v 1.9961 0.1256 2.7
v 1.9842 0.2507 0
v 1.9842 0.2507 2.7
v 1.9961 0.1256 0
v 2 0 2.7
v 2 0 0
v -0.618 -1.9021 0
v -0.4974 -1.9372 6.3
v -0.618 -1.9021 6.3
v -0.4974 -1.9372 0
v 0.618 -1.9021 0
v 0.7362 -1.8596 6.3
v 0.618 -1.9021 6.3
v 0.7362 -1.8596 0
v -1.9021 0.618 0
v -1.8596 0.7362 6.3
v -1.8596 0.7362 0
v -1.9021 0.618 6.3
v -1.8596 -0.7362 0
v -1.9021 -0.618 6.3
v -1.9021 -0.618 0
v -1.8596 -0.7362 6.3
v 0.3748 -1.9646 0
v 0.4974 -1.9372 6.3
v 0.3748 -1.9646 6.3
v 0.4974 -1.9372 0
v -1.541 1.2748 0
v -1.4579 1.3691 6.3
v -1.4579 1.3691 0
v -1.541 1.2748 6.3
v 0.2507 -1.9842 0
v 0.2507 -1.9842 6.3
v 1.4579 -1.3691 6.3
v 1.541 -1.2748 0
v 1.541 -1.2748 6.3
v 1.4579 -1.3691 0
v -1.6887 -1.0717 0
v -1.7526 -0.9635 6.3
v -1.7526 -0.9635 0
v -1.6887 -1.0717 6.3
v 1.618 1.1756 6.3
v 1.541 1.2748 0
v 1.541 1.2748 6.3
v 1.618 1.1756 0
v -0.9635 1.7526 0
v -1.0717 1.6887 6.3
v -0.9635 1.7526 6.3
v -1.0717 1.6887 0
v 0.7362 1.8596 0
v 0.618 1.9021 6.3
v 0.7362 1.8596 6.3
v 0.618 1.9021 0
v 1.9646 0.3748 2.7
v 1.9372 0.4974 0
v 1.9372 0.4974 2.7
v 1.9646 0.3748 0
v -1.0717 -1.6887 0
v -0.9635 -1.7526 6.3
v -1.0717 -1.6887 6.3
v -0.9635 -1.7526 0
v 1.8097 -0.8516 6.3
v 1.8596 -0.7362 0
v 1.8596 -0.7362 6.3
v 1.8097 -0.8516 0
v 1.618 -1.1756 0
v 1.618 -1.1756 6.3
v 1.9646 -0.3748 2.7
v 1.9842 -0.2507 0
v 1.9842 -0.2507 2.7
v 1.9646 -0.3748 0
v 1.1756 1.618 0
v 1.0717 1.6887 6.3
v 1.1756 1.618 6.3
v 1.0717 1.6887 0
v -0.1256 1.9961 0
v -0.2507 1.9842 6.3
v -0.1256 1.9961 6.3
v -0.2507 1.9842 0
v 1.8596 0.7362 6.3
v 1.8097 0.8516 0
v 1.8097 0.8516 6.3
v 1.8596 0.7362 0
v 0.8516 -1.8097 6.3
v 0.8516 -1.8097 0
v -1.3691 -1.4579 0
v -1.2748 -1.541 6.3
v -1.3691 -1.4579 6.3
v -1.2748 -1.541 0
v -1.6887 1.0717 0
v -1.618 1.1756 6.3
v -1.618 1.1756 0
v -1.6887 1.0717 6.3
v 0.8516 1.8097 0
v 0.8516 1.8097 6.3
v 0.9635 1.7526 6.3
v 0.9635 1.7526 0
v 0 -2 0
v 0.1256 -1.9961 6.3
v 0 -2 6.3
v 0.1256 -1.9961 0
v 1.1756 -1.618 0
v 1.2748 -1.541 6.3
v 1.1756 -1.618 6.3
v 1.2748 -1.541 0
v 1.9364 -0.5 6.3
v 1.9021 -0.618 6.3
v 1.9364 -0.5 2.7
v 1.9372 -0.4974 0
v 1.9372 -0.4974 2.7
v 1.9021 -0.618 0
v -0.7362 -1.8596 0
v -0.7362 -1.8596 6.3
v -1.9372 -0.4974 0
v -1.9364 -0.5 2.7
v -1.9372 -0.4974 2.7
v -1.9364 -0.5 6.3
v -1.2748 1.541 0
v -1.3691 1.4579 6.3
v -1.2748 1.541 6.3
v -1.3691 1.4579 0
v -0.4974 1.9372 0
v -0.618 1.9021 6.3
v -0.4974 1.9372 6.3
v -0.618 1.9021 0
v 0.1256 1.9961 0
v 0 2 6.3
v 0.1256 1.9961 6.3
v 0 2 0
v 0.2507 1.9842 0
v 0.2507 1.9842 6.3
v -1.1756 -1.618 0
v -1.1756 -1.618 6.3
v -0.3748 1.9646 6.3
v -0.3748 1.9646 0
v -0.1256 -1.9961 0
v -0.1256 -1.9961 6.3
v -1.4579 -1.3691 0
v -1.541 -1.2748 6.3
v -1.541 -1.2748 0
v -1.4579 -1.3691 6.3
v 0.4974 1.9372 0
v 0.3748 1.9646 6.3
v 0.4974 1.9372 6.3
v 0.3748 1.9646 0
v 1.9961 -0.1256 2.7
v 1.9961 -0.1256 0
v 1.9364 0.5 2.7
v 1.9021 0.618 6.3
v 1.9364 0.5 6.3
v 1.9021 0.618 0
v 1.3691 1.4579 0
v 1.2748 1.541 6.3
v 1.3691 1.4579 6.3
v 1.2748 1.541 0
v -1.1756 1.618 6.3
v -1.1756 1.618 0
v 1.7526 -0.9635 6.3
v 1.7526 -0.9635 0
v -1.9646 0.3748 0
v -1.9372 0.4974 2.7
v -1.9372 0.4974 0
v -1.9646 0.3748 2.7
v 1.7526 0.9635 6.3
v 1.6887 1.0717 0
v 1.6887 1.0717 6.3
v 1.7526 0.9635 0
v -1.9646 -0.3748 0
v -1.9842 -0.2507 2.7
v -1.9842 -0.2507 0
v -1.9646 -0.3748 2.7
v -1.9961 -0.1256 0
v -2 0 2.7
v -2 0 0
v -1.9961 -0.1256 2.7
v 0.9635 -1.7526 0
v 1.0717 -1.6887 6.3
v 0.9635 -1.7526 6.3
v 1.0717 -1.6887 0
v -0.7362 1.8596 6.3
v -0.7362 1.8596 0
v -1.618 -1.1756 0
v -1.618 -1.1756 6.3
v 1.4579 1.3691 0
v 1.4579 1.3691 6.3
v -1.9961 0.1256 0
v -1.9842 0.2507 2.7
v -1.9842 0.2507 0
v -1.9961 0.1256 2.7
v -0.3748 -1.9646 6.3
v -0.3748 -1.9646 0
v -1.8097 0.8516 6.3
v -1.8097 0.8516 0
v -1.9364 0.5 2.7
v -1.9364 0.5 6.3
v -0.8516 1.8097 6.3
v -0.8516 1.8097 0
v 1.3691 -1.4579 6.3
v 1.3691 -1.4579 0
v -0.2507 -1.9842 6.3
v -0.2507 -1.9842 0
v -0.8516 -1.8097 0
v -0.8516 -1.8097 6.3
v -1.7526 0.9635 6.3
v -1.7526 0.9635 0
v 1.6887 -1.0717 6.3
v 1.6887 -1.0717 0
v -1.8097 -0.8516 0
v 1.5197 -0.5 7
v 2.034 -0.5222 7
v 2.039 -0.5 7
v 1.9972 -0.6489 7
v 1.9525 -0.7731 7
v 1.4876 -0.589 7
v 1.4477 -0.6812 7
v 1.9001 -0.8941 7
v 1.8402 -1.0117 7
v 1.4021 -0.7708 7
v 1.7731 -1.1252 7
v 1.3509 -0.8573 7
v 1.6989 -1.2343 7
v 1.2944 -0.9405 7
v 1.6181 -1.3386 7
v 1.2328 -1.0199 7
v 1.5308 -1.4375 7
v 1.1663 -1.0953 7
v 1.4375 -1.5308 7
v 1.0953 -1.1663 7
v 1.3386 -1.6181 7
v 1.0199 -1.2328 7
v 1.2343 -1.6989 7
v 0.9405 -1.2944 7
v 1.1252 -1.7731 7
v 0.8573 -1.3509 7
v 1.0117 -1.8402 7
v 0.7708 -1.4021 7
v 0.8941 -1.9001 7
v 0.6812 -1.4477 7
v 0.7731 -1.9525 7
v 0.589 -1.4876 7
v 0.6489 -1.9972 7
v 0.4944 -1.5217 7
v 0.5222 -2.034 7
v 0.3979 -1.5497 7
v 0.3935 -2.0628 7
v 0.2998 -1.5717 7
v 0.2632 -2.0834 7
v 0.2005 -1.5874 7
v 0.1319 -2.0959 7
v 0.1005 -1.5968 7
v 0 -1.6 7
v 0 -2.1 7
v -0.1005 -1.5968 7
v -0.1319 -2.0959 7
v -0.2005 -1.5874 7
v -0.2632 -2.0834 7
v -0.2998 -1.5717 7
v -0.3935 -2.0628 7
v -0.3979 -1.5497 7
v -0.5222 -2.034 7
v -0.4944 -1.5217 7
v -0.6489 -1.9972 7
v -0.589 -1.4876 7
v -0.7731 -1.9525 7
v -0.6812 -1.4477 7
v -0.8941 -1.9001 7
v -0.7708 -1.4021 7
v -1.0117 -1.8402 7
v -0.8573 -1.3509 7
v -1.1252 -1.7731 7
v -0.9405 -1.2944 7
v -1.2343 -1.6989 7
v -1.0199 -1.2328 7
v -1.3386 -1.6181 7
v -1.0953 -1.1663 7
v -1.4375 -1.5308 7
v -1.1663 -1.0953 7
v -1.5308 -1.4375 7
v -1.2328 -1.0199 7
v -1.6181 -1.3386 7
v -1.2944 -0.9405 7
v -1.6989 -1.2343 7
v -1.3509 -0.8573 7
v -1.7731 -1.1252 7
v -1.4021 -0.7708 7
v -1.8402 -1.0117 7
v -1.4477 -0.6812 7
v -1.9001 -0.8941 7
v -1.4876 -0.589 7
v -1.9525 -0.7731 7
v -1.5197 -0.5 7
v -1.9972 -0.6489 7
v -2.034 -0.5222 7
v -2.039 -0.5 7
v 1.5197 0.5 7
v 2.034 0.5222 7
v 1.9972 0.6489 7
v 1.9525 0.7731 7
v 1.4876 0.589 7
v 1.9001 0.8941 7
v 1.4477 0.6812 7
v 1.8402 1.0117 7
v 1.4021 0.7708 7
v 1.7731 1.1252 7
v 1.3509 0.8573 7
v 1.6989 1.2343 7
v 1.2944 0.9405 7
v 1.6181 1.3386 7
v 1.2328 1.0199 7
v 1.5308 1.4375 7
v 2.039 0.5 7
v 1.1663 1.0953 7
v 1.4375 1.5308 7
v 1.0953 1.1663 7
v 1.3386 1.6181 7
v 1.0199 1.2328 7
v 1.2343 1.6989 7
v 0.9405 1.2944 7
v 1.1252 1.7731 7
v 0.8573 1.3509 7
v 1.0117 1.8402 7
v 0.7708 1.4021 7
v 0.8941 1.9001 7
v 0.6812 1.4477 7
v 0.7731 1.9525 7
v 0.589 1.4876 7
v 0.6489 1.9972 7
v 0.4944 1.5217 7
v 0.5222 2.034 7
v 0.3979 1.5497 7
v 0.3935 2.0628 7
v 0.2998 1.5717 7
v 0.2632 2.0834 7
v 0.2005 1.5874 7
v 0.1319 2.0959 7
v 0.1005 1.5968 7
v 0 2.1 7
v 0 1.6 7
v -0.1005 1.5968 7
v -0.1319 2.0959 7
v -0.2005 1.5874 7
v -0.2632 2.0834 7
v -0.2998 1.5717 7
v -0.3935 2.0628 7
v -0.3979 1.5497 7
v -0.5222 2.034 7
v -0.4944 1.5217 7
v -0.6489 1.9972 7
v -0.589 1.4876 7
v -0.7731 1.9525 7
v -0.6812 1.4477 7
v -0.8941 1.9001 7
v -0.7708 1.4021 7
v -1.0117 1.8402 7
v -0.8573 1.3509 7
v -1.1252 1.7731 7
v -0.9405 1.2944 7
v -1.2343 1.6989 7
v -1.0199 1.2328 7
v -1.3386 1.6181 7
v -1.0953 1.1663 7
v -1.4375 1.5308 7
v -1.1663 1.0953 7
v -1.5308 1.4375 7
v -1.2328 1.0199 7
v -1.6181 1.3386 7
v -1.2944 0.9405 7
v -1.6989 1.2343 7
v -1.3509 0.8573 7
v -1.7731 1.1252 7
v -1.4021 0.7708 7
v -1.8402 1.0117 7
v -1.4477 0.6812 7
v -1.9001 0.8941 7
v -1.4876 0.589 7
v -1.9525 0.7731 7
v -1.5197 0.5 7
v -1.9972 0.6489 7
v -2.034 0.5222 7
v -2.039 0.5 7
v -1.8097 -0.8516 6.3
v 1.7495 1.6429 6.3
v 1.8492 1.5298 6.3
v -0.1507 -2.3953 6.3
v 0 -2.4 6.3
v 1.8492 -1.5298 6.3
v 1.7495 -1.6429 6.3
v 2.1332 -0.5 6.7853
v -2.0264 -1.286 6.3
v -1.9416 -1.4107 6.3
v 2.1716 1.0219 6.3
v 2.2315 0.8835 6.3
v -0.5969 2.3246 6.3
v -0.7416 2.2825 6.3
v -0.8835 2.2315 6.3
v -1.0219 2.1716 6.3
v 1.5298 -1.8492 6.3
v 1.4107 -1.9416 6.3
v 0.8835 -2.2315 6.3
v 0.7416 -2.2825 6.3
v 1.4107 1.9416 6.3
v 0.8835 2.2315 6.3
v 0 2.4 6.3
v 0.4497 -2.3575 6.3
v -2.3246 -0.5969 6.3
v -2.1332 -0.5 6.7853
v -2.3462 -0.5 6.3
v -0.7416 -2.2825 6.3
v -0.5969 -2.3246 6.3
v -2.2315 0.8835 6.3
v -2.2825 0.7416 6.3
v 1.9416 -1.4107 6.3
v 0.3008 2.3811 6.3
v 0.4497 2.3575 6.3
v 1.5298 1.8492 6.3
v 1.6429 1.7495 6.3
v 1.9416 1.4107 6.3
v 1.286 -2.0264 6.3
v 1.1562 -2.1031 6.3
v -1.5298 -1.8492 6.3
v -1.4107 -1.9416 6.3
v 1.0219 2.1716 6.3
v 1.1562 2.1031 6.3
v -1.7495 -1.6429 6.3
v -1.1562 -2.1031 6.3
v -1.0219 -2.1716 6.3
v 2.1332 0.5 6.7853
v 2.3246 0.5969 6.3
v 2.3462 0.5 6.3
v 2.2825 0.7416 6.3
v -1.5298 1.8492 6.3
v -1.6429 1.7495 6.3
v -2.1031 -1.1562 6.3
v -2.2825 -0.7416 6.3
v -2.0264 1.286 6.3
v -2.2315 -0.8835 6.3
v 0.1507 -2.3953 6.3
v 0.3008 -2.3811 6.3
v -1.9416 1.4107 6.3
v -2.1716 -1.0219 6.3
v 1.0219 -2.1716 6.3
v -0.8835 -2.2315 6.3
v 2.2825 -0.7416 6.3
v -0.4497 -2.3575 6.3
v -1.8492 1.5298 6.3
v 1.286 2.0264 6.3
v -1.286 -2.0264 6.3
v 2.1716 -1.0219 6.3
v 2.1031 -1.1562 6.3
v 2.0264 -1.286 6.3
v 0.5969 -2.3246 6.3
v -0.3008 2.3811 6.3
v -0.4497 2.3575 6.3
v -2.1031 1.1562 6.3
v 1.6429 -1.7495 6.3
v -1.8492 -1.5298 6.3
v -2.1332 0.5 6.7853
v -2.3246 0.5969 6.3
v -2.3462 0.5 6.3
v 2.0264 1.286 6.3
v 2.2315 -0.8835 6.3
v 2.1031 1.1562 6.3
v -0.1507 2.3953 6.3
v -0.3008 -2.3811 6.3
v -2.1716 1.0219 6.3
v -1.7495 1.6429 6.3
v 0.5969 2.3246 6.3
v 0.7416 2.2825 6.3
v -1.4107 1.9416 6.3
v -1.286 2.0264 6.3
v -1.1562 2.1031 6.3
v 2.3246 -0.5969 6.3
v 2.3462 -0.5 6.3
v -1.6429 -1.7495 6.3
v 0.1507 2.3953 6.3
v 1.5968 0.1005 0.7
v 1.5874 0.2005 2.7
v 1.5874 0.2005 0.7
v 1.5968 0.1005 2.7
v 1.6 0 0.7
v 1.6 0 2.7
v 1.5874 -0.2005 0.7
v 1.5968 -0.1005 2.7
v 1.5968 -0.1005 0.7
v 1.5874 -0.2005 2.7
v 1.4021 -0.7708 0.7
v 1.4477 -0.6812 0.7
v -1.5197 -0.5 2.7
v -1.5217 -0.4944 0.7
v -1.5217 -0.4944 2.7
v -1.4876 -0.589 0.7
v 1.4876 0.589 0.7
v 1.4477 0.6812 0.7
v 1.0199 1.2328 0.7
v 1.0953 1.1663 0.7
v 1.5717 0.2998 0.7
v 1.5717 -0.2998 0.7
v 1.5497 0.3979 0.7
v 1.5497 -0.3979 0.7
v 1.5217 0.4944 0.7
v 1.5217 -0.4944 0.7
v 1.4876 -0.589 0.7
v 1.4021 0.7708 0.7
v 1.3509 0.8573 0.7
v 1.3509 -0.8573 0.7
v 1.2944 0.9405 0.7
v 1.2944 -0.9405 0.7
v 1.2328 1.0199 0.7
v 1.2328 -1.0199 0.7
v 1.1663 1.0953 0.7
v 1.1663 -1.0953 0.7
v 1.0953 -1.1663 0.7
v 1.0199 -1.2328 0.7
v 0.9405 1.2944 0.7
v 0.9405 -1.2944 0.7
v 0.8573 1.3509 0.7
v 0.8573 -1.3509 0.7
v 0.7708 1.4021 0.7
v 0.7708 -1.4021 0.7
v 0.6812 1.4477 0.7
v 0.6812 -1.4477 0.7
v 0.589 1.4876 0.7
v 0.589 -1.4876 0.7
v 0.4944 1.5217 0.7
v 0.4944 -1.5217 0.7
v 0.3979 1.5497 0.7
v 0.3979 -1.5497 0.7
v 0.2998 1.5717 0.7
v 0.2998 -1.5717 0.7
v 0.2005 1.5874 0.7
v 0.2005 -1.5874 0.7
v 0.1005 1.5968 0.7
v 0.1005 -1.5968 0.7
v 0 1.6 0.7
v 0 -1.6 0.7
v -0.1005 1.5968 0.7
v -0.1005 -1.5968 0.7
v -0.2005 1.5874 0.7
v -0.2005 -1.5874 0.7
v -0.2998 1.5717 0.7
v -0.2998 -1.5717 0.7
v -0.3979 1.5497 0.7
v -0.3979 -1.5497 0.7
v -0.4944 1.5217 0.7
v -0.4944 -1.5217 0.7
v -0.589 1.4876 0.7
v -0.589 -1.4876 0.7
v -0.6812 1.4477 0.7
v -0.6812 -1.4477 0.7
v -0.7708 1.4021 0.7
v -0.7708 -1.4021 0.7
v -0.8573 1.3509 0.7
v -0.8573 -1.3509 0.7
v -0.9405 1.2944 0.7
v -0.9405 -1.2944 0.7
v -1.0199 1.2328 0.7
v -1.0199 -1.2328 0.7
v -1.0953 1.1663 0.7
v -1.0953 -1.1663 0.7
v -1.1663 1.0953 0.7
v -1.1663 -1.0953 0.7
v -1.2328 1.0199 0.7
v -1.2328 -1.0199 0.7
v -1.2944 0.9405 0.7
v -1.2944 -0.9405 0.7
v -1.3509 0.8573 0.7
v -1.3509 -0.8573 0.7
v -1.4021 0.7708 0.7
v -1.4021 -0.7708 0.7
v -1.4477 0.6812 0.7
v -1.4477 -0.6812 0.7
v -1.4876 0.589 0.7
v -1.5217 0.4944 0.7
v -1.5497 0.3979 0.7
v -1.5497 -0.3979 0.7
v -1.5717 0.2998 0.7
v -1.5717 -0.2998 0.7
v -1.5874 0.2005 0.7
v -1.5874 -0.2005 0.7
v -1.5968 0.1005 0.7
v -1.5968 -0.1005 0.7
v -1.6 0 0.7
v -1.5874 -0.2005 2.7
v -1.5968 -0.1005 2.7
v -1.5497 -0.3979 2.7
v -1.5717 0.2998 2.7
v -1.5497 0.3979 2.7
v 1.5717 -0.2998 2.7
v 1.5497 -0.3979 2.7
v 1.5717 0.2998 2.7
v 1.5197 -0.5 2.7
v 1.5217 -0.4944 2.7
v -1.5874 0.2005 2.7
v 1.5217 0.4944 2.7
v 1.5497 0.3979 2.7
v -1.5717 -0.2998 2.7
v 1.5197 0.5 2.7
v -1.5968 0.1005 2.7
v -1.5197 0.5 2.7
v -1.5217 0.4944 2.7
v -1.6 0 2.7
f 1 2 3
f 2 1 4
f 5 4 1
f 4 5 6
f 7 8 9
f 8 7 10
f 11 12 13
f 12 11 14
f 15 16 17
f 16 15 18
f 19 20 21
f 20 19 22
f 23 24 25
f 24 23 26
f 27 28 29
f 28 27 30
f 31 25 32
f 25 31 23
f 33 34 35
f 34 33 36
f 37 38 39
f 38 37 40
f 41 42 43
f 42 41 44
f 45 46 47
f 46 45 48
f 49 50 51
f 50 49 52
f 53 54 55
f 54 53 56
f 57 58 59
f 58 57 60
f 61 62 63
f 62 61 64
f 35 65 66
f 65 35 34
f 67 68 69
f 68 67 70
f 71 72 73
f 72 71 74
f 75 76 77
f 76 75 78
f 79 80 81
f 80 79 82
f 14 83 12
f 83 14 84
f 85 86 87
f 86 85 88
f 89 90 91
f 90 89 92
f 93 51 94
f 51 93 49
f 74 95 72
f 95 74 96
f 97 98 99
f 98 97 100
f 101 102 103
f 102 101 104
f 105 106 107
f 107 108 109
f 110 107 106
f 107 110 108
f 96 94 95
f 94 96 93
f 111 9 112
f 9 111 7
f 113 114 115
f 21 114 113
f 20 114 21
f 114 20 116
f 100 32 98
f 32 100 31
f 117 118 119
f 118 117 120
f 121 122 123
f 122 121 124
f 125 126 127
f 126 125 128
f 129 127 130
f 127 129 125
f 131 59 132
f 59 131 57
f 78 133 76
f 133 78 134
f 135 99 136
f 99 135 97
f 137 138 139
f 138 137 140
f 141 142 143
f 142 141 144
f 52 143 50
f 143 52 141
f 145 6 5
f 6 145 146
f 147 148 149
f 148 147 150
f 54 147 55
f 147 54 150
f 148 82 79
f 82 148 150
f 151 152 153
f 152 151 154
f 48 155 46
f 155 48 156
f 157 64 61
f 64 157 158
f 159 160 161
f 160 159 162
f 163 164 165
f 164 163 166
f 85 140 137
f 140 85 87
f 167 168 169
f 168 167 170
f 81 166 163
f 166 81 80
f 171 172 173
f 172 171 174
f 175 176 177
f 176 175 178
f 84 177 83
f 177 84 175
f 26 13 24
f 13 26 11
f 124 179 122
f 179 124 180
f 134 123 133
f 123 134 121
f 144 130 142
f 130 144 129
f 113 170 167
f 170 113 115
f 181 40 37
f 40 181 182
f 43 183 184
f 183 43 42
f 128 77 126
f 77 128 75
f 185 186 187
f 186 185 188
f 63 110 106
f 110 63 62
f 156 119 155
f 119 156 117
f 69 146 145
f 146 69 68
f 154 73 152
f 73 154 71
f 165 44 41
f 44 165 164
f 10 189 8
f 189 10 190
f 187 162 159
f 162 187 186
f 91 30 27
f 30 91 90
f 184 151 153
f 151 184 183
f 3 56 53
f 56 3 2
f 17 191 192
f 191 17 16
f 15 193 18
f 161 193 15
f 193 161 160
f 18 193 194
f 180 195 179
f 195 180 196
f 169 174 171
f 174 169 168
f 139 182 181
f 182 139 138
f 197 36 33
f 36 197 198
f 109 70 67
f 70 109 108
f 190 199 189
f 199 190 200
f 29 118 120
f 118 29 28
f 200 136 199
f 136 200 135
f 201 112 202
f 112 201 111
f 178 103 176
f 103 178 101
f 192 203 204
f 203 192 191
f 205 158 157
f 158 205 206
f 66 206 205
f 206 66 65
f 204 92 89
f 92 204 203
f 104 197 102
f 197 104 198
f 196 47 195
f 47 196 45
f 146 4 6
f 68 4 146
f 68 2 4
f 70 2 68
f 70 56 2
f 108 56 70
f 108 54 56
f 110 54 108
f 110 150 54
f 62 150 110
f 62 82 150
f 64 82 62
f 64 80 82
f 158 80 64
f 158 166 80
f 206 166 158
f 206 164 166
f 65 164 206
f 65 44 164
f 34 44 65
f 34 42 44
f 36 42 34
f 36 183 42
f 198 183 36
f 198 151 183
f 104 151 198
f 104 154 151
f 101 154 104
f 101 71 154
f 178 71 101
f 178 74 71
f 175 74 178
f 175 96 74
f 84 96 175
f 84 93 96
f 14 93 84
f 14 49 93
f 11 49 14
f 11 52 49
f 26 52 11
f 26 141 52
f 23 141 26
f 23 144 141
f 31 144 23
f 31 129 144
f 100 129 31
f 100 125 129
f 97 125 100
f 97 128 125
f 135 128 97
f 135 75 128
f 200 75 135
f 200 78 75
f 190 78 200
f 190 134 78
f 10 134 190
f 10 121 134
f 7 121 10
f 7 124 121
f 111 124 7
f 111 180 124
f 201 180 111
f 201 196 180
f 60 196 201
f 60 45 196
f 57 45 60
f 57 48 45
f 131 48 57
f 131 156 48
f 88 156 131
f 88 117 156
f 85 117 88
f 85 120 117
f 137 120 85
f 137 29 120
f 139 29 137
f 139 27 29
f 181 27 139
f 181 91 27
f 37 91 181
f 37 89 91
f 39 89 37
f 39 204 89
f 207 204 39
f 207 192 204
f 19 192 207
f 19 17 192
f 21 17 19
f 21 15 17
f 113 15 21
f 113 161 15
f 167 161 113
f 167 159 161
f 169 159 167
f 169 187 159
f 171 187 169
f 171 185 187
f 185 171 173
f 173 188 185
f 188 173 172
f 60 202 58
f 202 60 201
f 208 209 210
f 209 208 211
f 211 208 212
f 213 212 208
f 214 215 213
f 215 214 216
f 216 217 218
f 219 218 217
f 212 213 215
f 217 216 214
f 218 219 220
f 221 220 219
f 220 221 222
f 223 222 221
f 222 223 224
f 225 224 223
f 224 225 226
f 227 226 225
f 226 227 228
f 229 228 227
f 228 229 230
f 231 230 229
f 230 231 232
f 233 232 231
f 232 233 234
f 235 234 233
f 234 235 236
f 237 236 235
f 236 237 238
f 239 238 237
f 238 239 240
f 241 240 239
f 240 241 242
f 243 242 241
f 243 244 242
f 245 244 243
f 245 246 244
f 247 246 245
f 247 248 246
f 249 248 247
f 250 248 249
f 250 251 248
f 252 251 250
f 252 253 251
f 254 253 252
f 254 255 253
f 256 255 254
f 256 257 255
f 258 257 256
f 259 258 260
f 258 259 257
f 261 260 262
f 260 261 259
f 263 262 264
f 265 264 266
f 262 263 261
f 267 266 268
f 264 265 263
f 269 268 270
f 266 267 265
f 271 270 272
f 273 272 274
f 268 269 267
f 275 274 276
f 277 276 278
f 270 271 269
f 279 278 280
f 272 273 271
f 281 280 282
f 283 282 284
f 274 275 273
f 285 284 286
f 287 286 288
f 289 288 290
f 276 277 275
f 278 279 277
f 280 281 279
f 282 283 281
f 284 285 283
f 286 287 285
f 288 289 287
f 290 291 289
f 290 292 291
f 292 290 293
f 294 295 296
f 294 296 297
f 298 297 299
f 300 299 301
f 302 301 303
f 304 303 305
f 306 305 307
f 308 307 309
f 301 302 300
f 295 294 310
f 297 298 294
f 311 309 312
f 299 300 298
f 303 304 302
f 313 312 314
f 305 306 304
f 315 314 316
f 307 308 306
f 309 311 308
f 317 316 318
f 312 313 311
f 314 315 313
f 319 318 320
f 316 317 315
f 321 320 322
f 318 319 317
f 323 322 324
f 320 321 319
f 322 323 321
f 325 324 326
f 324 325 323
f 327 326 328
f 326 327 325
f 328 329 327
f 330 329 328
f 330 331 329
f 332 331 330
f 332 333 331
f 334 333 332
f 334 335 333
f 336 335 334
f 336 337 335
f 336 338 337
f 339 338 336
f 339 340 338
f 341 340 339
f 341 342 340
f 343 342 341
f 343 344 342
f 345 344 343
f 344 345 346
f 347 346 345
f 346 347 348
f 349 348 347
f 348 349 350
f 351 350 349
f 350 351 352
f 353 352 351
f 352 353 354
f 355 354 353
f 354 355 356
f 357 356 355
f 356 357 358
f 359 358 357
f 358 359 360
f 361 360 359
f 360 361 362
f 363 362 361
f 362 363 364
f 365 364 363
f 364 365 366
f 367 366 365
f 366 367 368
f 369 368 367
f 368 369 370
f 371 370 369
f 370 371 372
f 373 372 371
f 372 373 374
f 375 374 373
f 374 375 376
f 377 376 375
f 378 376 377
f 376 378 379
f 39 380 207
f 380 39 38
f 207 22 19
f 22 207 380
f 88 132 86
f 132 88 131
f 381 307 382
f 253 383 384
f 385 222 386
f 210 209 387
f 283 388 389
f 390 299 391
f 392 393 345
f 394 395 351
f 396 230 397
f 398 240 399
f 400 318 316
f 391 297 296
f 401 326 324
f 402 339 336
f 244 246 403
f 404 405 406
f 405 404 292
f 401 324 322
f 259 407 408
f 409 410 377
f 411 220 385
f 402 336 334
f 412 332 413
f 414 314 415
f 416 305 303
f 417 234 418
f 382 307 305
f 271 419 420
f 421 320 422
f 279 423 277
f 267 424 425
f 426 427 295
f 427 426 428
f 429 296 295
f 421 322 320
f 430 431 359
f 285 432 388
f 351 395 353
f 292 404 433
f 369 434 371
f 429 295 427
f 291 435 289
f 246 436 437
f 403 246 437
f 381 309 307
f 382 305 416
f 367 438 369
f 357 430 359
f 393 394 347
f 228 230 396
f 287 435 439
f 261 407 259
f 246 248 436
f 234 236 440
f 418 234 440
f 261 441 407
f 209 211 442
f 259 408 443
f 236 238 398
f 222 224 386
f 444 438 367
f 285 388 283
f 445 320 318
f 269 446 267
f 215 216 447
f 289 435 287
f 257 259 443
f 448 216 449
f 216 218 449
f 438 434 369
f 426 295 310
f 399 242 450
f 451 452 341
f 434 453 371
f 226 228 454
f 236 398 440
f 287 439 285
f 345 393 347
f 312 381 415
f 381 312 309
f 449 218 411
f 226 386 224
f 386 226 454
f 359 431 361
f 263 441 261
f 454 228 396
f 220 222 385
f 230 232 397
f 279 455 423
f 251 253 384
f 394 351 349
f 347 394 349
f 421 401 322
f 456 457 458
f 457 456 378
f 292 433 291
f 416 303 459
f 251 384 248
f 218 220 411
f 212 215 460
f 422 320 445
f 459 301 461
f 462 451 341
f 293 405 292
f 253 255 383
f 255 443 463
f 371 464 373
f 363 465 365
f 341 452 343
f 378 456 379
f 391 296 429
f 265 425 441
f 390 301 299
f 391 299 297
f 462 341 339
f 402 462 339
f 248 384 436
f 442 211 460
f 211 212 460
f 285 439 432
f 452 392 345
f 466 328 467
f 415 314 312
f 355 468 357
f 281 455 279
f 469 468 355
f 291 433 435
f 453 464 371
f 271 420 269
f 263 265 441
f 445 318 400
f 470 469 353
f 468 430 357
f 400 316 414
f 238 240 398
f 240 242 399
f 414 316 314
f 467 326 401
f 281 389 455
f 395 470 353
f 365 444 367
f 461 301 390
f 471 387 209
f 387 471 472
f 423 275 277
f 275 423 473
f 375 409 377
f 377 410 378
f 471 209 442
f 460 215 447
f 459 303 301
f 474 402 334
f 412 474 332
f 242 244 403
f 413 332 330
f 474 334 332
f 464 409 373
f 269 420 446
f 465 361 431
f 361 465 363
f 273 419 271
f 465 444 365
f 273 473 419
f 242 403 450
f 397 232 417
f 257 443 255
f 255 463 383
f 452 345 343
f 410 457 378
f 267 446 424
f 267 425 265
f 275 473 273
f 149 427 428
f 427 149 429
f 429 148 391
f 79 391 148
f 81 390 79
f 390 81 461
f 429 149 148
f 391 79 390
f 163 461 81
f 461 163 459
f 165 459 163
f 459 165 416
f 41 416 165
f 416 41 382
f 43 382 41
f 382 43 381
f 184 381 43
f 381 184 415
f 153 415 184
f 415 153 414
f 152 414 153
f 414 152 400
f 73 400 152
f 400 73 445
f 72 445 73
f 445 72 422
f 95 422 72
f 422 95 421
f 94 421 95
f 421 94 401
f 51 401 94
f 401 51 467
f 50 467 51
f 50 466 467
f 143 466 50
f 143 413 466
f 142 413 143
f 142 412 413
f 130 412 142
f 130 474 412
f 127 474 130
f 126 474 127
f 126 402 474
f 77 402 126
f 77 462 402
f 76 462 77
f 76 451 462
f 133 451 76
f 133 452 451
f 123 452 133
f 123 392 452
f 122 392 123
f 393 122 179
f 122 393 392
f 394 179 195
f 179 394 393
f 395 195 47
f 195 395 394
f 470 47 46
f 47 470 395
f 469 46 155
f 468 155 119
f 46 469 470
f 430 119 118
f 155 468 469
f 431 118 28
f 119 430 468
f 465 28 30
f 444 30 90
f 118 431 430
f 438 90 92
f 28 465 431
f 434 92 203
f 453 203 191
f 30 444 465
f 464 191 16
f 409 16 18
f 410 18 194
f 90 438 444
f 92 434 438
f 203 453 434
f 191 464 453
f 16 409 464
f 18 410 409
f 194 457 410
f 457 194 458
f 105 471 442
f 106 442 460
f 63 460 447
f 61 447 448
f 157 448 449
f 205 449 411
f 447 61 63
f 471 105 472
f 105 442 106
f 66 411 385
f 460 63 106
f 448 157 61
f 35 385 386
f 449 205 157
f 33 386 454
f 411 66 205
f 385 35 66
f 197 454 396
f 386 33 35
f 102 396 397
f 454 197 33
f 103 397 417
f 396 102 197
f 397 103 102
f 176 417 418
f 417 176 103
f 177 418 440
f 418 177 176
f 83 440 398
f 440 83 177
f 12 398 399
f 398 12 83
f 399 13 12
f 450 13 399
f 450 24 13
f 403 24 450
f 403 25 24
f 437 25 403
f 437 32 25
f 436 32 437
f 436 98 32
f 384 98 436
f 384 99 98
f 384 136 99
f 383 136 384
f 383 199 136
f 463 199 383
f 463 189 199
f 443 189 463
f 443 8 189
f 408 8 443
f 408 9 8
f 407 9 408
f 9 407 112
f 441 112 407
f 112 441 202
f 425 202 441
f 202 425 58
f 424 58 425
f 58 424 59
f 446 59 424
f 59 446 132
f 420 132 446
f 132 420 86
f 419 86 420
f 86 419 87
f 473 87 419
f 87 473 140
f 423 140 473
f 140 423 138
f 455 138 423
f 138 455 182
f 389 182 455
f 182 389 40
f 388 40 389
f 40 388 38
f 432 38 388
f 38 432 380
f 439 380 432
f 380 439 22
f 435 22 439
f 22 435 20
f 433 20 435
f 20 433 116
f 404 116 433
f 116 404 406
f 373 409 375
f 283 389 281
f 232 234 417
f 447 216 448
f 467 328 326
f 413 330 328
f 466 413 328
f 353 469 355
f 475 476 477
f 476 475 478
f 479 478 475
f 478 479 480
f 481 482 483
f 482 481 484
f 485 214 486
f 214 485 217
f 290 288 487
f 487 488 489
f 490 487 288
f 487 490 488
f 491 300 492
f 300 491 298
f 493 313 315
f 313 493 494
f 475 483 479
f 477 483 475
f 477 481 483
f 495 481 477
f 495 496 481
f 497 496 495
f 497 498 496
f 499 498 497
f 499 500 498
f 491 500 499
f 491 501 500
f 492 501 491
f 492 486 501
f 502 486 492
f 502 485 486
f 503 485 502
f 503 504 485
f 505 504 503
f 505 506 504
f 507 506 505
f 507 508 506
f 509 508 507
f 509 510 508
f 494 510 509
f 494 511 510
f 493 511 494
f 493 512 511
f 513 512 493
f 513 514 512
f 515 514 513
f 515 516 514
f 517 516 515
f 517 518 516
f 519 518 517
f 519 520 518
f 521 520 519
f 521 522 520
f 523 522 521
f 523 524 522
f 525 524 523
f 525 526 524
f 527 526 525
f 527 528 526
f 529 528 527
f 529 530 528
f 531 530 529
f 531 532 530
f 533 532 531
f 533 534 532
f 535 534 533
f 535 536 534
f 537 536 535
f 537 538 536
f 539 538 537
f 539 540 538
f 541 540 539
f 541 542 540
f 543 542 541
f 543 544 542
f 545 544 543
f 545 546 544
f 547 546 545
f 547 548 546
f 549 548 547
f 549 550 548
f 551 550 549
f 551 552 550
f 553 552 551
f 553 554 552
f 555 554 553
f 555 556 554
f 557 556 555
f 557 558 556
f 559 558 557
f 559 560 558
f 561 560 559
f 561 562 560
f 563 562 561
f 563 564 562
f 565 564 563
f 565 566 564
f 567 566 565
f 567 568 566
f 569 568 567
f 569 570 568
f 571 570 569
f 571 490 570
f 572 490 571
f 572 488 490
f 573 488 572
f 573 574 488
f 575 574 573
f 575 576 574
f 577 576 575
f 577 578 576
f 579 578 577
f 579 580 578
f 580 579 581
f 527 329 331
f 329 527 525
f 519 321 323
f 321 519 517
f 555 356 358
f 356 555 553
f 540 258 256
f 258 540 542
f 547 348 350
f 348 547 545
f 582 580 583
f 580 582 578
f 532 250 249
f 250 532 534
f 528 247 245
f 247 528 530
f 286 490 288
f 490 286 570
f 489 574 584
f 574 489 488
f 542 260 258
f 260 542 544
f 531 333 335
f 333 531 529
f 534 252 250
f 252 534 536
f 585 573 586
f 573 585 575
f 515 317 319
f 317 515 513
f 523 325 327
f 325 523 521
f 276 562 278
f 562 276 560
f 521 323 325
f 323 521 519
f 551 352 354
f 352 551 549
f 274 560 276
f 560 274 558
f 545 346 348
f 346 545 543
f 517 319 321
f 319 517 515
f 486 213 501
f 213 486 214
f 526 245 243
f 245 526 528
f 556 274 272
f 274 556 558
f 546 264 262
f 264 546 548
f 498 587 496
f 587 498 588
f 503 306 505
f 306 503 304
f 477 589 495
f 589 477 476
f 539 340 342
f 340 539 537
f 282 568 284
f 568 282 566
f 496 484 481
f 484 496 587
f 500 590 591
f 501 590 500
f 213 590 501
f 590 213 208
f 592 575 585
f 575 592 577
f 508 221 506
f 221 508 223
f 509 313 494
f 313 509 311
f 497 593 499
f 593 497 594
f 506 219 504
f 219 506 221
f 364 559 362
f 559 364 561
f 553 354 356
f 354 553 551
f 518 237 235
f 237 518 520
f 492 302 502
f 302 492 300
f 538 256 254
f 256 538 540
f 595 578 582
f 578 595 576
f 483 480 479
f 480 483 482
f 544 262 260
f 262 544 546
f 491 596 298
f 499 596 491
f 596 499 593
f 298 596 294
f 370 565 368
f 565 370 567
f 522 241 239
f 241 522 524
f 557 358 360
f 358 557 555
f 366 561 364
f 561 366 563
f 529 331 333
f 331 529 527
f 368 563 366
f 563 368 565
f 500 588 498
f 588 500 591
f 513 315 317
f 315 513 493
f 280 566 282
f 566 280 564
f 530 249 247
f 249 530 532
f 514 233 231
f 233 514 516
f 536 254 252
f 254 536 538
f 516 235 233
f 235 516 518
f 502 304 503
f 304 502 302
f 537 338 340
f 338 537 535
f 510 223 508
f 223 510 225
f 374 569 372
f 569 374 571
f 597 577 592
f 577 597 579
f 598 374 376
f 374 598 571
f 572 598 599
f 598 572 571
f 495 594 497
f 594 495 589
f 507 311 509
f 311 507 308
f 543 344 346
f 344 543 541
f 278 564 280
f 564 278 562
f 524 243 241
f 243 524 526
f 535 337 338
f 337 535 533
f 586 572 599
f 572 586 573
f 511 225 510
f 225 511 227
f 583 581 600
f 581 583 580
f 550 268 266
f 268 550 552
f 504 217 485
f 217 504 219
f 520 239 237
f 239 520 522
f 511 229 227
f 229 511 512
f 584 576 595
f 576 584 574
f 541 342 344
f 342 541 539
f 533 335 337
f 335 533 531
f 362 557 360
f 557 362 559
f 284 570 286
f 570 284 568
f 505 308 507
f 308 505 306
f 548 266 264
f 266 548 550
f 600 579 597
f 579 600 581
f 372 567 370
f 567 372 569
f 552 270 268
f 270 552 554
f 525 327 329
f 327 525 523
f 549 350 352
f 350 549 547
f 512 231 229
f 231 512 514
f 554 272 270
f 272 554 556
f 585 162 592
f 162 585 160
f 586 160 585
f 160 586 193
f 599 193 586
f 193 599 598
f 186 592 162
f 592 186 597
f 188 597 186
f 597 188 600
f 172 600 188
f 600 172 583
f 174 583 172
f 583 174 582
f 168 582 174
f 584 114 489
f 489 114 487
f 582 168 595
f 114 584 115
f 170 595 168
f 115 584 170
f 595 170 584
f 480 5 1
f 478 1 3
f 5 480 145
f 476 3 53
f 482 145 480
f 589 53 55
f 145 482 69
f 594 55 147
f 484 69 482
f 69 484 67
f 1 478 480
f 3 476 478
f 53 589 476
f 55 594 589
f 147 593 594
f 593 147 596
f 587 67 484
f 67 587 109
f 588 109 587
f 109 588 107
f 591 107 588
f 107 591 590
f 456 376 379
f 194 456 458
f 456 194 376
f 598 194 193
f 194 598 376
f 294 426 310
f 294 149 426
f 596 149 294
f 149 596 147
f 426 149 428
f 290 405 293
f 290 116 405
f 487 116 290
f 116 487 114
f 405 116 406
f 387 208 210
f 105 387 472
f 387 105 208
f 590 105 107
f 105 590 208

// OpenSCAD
height = 7;
radius = 2;

difference(){
	
	union() {

		cylinder(height,radius, radius,$fn=100);

		translate([0,0,height-height*0.1]){
			cylinder(height*0.1,radius*1.2, radius*1.05,$fn=100);
		}
	}

	translate([0,0,0.1*height]){
		cylinder(height,radius*0.8, radius*0.8,$fn=100);
	}

	translate([0,0,0.1*height + 7]){

		cube([6,1,10],center=true);
	}
	
}
